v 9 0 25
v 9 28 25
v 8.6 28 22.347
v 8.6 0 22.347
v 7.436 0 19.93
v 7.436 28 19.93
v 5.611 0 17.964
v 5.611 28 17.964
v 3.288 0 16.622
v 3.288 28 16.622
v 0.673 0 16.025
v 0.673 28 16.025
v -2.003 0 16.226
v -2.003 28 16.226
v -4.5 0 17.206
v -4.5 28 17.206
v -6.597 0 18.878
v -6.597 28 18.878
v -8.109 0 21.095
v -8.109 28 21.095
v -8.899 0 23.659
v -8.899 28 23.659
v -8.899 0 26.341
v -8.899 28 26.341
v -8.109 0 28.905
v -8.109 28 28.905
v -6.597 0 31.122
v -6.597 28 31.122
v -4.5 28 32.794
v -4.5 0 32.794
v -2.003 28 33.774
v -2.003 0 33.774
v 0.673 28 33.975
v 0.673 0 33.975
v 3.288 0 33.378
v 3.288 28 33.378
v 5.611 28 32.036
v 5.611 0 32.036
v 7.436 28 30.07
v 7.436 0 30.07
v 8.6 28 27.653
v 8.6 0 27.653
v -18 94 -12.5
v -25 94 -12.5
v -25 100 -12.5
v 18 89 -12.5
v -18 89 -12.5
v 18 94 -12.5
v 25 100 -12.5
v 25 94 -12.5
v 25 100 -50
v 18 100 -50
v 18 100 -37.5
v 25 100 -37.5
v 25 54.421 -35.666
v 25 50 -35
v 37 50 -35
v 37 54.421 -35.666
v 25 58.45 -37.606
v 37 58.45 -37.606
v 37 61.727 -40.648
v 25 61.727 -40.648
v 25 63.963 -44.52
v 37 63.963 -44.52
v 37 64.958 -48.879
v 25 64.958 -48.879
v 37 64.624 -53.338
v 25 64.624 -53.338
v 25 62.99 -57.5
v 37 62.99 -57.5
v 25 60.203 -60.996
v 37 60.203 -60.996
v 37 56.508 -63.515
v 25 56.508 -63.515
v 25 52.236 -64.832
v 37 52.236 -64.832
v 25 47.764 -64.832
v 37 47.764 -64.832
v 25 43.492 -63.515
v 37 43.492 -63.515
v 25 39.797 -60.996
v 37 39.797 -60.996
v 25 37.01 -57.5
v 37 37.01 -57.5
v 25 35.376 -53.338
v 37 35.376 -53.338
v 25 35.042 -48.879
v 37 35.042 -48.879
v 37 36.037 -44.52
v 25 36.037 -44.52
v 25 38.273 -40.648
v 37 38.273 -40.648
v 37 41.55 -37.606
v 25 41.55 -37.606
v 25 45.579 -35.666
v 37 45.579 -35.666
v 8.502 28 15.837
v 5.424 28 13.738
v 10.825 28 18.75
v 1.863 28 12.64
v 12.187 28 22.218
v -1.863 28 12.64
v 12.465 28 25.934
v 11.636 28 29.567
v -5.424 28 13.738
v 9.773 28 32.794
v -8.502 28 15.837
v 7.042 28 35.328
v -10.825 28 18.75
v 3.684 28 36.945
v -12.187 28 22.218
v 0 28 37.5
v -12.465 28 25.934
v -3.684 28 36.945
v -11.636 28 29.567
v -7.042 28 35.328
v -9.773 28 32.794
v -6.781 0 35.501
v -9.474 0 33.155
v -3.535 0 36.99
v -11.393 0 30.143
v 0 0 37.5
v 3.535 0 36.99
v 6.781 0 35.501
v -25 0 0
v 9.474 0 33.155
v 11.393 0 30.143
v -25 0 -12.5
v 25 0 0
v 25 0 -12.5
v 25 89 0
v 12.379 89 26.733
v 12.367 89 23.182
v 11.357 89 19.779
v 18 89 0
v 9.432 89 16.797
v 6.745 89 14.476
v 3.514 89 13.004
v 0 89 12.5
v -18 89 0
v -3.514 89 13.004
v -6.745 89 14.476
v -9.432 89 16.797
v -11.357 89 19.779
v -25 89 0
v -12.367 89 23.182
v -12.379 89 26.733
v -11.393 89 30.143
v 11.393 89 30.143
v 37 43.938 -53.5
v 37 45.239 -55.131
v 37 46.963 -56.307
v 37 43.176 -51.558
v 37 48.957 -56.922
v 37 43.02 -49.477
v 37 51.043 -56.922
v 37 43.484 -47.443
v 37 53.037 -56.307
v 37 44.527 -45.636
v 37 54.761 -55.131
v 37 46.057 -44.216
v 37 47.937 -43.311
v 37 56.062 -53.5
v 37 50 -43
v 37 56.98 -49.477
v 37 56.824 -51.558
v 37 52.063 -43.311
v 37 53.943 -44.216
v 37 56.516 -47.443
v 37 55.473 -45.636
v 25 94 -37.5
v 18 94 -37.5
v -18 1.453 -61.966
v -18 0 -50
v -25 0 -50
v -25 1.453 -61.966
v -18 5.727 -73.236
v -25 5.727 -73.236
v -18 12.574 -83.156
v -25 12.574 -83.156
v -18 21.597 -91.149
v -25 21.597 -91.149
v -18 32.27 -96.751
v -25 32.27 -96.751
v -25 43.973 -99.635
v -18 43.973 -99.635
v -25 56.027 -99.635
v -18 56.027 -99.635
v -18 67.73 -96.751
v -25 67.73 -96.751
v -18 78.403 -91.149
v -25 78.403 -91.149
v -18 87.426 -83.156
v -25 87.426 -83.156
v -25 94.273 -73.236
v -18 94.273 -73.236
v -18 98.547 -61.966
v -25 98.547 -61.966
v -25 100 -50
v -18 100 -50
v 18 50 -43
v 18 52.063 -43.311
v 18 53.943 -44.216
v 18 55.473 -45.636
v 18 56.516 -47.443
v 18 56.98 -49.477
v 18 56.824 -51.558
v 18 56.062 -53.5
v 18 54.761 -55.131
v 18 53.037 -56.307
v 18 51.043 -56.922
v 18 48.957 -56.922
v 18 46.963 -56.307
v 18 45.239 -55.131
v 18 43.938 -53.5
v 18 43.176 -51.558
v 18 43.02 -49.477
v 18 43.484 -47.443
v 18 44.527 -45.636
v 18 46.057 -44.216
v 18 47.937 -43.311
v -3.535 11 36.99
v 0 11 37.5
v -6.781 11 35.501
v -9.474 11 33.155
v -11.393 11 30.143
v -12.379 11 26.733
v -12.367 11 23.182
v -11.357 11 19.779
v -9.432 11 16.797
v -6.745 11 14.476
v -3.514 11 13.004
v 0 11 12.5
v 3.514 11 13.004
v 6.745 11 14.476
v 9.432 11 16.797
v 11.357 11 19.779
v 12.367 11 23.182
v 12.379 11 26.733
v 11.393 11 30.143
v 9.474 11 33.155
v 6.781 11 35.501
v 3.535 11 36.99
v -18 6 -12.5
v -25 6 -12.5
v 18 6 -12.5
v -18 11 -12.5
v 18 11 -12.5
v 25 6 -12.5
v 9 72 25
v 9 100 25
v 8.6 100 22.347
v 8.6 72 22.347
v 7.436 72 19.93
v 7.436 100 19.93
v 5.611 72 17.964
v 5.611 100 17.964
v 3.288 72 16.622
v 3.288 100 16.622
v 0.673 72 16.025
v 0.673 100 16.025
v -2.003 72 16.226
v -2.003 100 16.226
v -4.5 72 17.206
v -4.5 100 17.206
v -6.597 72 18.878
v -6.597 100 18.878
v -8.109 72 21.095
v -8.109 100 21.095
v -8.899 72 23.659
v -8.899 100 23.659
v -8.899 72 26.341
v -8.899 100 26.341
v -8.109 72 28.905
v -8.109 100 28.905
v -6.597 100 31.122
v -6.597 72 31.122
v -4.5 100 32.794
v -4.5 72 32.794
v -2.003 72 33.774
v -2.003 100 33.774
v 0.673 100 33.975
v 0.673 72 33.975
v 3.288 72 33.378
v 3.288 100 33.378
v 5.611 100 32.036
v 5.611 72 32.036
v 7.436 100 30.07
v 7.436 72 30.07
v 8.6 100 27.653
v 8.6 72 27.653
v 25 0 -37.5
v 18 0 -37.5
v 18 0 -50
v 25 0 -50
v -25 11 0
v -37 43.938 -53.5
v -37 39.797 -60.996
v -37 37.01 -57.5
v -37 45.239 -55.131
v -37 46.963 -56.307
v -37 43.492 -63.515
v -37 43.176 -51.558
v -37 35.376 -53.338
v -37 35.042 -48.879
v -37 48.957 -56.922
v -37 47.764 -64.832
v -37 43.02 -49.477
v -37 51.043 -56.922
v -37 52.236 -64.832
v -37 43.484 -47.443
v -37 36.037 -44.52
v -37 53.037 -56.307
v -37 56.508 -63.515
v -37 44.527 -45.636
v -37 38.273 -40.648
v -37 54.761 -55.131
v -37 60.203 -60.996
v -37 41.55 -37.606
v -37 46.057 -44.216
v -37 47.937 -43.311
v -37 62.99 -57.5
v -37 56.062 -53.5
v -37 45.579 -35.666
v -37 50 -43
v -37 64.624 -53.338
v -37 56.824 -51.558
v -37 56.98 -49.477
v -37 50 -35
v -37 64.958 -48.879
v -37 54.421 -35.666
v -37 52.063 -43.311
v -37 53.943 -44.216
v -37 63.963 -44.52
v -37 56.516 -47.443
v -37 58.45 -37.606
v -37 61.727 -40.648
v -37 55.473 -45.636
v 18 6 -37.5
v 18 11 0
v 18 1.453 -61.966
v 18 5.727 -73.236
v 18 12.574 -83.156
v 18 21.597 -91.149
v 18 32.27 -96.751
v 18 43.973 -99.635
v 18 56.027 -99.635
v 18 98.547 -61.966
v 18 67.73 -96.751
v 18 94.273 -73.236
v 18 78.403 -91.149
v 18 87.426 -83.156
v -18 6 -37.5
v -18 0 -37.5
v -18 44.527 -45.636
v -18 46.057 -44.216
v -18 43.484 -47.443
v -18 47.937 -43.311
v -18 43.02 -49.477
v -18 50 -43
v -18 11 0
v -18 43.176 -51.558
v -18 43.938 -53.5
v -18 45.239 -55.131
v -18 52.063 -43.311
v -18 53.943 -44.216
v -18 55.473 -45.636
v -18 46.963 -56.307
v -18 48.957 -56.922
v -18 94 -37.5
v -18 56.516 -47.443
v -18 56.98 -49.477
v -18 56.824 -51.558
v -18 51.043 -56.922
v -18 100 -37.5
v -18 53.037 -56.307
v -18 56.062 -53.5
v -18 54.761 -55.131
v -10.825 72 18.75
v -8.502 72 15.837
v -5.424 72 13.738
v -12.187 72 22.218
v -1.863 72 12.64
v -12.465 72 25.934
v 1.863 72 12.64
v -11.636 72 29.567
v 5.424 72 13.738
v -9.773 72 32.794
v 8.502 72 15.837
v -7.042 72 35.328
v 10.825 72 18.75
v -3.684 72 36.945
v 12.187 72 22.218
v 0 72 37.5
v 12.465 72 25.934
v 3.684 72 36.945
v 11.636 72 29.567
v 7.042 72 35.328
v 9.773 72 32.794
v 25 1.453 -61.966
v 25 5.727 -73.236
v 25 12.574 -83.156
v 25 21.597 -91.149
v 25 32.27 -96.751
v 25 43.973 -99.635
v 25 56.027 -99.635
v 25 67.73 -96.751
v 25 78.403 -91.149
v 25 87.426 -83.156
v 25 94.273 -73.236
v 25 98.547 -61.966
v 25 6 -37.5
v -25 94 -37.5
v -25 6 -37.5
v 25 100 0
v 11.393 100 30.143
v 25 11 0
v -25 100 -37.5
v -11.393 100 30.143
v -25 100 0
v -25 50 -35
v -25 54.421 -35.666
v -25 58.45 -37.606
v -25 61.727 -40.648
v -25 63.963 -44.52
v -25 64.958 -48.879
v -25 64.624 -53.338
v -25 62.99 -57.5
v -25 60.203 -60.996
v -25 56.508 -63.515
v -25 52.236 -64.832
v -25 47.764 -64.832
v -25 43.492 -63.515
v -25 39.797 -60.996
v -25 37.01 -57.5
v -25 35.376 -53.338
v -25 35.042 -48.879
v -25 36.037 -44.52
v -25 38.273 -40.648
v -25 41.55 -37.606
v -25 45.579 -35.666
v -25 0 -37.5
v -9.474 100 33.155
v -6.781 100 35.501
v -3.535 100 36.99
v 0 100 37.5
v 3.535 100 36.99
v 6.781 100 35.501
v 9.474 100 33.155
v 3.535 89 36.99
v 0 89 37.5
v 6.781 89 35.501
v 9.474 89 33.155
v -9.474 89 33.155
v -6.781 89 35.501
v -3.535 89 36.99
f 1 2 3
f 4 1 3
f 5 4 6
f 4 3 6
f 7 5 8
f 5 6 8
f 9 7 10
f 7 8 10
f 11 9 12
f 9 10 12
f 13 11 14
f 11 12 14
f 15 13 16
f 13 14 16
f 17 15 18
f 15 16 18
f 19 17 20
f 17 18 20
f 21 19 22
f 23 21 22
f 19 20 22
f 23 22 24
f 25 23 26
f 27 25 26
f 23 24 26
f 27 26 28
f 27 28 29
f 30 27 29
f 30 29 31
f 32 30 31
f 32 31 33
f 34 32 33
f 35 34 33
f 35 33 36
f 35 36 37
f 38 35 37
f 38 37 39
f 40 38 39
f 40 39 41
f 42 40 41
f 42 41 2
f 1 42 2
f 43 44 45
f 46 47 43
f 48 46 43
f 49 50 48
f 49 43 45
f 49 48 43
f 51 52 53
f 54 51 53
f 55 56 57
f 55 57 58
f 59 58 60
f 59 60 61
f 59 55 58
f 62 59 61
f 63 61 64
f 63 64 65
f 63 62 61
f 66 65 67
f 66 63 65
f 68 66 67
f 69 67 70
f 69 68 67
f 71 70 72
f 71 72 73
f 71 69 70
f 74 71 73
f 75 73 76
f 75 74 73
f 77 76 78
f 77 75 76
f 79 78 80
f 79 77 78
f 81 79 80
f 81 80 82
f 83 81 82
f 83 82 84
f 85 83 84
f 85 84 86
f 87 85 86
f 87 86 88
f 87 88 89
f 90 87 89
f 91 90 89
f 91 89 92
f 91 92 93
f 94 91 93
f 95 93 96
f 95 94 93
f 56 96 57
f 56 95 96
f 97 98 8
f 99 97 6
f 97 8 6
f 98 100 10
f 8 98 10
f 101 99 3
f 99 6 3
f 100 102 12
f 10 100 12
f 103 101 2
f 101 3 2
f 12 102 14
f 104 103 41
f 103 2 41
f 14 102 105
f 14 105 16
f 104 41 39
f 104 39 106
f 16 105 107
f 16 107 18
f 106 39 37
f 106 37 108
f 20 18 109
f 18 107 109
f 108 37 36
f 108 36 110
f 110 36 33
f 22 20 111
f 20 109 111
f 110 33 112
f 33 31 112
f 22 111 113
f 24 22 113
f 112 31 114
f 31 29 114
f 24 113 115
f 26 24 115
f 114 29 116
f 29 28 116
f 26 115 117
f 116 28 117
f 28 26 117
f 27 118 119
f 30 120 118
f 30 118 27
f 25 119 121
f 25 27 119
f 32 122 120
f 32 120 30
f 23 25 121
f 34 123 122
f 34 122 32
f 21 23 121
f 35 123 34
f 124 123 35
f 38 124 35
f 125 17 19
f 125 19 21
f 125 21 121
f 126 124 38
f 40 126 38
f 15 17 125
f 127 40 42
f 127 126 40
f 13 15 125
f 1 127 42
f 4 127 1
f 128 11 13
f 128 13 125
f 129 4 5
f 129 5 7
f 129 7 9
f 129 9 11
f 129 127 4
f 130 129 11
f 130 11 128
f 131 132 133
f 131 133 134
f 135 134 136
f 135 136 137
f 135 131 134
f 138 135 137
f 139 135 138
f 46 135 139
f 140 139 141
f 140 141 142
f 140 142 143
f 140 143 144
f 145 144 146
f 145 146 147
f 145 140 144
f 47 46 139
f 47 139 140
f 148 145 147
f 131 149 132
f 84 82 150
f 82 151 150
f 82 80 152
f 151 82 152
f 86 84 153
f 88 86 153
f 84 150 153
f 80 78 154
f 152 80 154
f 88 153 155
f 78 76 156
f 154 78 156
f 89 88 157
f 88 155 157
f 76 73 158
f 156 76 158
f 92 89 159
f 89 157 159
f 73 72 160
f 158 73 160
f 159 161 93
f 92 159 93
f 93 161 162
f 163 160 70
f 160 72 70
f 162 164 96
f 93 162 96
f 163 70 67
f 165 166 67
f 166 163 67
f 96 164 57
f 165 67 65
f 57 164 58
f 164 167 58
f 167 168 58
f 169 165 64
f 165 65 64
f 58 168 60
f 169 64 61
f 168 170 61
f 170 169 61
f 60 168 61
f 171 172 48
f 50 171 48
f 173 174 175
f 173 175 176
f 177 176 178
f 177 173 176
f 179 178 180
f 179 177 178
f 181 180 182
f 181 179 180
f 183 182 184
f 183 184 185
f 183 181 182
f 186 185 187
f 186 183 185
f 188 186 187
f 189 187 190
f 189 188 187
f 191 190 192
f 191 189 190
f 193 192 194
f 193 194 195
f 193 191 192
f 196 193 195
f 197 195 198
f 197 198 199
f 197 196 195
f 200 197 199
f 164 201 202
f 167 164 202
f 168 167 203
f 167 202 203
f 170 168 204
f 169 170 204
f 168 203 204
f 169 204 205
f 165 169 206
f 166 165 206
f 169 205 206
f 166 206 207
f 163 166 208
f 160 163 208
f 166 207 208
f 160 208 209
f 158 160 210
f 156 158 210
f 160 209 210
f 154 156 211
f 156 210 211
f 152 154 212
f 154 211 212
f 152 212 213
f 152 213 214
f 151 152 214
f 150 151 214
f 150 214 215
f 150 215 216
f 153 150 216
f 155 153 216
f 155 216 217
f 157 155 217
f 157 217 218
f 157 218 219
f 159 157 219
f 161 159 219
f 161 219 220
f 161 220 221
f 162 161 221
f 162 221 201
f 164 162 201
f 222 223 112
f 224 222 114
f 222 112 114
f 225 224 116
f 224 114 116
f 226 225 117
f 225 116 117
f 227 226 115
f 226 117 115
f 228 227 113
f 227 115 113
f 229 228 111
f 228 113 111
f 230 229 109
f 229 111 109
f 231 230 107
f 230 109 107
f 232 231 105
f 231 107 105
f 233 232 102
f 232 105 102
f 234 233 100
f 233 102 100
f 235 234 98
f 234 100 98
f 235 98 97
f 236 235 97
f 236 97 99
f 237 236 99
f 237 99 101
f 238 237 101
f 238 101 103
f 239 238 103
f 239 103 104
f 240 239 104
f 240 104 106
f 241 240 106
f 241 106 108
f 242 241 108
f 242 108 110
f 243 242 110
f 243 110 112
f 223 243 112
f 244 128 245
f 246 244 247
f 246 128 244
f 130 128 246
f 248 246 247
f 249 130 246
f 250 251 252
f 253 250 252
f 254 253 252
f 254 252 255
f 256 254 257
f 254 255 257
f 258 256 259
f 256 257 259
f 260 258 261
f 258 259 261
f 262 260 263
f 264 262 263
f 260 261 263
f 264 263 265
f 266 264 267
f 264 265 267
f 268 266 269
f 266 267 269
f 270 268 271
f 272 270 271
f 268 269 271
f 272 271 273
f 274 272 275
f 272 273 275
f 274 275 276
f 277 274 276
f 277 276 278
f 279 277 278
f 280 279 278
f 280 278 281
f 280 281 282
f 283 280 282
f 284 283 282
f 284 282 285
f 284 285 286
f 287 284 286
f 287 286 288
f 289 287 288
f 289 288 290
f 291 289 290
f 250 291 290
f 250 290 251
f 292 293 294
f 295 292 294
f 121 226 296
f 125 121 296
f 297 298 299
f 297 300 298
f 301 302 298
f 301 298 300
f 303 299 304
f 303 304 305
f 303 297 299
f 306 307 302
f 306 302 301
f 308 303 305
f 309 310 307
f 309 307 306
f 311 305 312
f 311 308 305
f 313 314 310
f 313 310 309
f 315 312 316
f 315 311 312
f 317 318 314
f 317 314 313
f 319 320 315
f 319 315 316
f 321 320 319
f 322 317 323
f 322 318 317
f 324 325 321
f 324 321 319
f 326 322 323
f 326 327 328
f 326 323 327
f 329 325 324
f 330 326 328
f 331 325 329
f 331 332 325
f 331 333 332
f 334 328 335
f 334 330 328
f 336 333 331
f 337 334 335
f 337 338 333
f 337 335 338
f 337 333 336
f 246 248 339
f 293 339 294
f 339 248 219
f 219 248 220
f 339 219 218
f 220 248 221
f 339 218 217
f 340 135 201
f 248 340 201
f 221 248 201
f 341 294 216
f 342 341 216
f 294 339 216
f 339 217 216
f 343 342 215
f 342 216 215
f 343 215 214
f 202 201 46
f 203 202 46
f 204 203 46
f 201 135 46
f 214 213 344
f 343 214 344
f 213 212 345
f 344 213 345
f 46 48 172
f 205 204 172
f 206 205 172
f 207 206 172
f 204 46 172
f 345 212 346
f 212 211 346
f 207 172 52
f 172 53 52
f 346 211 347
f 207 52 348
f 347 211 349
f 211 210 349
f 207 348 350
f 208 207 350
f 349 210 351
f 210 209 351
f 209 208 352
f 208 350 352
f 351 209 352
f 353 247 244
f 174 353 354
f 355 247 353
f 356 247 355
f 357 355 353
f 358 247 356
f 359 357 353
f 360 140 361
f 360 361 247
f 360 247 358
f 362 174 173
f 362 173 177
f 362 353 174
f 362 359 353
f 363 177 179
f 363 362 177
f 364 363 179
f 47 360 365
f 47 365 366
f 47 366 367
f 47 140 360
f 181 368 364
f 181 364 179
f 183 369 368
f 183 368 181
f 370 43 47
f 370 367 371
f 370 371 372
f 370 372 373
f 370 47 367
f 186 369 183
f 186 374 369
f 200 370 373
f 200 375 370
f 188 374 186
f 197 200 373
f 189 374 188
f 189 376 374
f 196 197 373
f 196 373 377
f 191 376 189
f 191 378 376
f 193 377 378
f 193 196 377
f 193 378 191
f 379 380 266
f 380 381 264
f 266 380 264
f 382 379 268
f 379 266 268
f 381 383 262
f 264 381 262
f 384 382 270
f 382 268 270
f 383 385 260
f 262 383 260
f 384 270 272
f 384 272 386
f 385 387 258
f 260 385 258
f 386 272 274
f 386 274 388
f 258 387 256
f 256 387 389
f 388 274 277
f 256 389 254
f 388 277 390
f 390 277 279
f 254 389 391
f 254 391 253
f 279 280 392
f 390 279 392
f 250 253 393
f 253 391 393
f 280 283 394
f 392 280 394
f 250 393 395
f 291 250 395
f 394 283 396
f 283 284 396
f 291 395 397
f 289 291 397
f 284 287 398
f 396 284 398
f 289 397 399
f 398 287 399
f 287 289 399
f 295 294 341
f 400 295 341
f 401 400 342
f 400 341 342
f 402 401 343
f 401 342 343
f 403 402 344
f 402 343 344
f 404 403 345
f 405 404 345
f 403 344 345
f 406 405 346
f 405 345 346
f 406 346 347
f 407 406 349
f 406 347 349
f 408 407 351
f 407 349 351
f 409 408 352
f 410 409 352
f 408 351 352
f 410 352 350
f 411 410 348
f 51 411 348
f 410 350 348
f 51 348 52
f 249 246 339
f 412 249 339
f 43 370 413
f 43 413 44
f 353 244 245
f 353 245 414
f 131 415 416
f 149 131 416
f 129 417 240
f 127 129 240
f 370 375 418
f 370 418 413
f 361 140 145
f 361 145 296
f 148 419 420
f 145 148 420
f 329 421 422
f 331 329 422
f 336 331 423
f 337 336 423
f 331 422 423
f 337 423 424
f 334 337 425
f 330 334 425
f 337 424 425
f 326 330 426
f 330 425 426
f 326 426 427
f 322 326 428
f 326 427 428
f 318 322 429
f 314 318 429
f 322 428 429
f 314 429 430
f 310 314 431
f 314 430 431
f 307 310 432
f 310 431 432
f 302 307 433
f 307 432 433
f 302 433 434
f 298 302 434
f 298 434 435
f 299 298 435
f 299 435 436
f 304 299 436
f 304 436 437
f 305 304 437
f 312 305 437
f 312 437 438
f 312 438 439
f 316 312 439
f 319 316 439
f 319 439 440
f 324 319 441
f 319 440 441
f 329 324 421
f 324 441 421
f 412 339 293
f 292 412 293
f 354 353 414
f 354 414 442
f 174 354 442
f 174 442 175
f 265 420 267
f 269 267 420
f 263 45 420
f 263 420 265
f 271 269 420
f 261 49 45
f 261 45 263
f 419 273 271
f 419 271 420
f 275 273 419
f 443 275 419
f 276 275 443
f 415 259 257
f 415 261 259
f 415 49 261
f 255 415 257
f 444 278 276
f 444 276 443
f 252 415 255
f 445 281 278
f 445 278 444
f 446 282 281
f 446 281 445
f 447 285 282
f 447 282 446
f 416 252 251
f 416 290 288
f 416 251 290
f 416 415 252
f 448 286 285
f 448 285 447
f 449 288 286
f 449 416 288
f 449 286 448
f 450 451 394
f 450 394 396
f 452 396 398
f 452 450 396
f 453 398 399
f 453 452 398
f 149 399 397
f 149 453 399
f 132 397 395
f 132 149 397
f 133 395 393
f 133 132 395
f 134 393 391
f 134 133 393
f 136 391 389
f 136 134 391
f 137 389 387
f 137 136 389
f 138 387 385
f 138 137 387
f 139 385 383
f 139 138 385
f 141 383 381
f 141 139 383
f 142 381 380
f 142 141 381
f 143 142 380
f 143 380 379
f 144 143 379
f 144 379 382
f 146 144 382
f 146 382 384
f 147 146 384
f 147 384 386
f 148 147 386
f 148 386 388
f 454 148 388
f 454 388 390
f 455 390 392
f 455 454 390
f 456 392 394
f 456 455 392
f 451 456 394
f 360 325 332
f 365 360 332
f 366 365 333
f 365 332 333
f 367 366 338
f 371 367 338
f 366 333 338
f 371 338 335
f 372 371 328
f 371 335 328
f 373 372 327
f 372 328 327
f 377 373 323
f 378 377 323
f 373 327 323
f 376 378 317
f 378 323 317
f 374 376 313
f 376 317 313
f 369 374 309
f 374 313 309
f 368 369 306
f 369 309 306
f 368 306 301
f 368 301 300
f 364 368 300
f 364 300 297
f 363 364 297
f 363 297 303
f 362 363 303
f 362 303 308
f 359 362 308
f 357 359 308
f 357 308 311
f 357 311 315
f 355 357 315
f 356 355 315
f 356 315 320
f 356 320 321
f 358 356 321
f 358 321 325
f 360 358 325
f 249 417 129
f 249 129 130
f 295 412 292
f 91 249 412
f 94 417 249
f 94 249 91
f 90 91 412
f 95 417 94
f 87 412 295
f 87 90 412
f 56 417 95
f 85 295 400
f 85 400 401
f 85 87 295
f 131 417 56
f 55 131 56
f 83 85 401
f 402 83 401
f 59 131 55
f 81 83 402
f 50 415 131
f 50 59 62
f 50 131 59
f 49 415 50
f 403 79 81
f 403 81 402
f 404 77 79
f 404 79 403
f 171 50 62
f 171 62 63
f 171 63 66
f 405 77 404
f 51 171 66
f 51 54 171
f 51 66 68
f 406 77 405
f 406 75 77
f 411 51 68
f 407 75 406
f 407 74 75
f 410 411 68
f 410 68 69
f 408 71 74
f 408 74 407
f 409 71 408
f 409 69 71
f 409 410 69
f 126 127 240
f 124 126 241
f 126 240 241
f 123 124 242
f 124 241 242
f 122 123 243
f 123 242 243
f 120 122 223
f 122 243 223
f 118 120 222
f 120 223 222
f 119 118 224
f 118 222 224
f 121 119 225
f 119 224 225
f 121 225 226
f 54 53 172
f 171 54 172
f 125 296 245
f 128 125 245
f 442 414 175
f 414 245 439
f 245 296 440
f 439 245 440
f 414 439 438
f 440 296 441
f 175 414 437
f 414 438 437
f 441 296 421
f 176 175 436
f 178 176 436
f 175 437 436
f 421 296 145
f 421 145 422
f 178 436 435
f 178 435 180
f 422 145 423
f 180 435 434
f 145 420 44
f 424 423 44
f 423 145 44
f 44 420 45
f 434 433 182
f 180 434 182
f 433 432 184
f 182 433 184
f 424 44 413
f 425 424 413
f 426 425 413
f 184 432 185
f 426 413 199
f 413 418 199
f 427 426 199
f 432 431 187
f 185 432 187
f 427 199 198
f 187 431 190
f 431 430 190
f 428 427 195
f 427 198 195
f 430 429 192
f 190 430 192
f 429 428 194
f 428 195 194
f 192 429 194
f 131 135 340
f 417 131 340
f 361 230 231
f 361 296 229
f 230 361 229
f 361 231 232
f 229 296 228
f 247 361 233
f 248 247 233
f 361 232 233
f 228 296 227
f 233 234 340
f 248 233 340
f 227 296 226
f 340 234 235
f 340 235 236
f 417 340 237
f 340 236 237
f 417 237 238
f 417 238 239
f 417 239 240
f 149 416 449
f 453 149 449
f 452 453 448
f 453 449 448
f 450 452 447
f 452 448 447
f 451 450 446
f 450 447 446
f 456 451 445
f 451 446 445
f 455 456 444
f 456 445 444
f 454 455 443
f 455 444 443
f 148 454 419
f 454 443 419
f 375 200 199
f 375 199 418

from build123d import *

# Parameters (mm, degrees)
BOSS_EXTRUDE1_START = 18
BOSS_EXTRUDE1_DEPTH = 7
BOSS_EXTRUDE3_START = -18
BOSS_EXTRUDE3_DEPTH = 7
BOSS_EXTRUDE4_DEPTH = 11
BOSS_EXTRUDE5_START = -11
BOSS_EXTRUDE5_DEPTH = 11
SKETCH9_R           = 12.5
BOSS_EXTRUDE6_DEPTH = 28
BOSS_EXTRUDE7_START = -28
SKETCH11_R          = 12.5
BOSS_EXTRUDE7_DEPTH = 28
HOLE1_D             = 18
SKETCH14_R          = 15
BOSS_EXTRUDE8_DEPTH = 12
HOLE2_D             = 14


with BuildPart() as part:
    # Sketch1 → Boss-Extrude1 (new body)
    with BuildSketch(Plane(origin=(0, 0, 0), x_dir=(0, 0, -1), z_dir=(1, 0, 0)).offset(BOSS_EXTRUDE1_START)):
        with BuildLine():
            Line((0, 0), (12.5, 0))
            Line((12.5, 0), (12.5, 6))
            Line((12.5, 6), (37.5, 6))
            Line((37.5, 6), (37.5, 0))
            Line((37.5, 0), (50, 0))
            ThreePointArc((50, 0), (100, 50), (50, 100))
            Line((50, 100), (37.5, 100))
            Line((37.5, 100), (37.5, 94))
            Line((37.5, 94), (12.5, 94))
            Line((12.5, 94), (12.5, 100))
            Line((12.5, 100), (0, 100))
            Line((0, 100), (0, 0))
        make_face()
    extrude(amount=BOSS_EXTRUDE1_DEPTH)



with BuildPart() as body_2:
    # Sketch3 → Boss-Extrude3 (new body)
    with BuildSketch(Plane(origin=(0, 0, 0), x_dir=(0, 0, -1), z_dir=(1, 0, 0)).offset(BOSS_EXTRUDE3_START)):
        with BuildLine():
            Line((0, 100), (0, 0))
            Line((0, 0), (12.5, 0))
            Line((12.5, 0), (12.5, 6))
            Line((12.5, 6), (37.5, 6))
            Line((37.5, 6), (37.5, 0))
            Line((37.5, 0), (50, 0))
            ThreePointArc((50, 0), (100, 50), (50, 100))
            Line((50, 100), (37.5, 100))
            Line((37.5, 100), (37.5, 94))
            Line((37.5, 94), (12.5, 94))
            Line((12.5, 94), (12.5, 100))
            Line((12.5, 100), (0, 100))
        make_face()
    extrude(amount=-BOSS_EXTRUDE3_DEPTH)


with BuildPart() as part_1:
    add(part.part)

    add(body_2.part)  # Boss-Extrude4 merges body 2
    # Sketch5 → Boss-Extrude4 (add)
    with BuildSketch(Plane(origin=(0, 100, 0), x_dir=(1, 0, 0), z_dir=(0, 1, 0))):
        with BuildLine():
            Line((-25, 12.5), (25, 12.5))
            Line((25, 12.5), (25, 0))
            Line((25, 0), (11.392973, -30.142973))
            ThreePointArc((11.392973, -30.142973), (0, -37.5), (-11.392973, -30.142973))
            Line((-11.392973, -30.142973), (-25, 0))
            Line((-25, 0), (-25, 12.5))
        make_face()
    extrude(amount=-BOSS_EXTRUDE4_DEPTH)

    # Sketch8 → Boss-Extrude5 (add)
    with BuildSketch(Plane.XZ.offset(BOSS_EXTRUDE5_START)):
        with BuildLine():
            Line((-25, 0), (-25, -12.5))
            Line((-25, -12.5), (-18, -12.5))
            Line((-18, -12.5), (18, -12.5))
            Line((18, -12.5), (25, -12.5))
            Line((25, -12.5), (25, 0))
            Line((25, 0), (11.392973, 30.142973))
            ThreePointArc((11.392973, 30.142973), (0, 37.5), (-11.392973, 30.142973))
            Line((-11.392973, 30.142973), (-25, 0))
        make_face()
    extrude(amount=BOSS_EXTRUDE5_DEPTH)

    # Sketch9 → Boss-Extrude6 (add)
    with BuildSketch(Plane(origin=(0, 100, 0), x_dir=(1, 0, 0), z_dir=(0, 1, 0))):
        with Locations(Location((0, -25, 0), (0, 0, 270))):
            Circle(SKETCH9_R)
    extrude(amount=-BOSS_EXTRUDE6_DEPTH)

    # Sketch11 → Boss-Extrude7 (add)
    with BuildSketch(Plane.XZ.offset(BOSS_EXTRUDE7_START)):
        with Locations(Location((0, 25, 0), (0, 0, 90))):
            Circle(SKETCH11_R)
    extrude(amount=BOSS_EXTRUDE7_DEPTH)

    # Hole1 (through all)
    with Locations(Plane(origin=(0, 0, 0), x_dir=(-1, 0, 0), z_dir=(0, -1, 0))):
        with Locations((0, -25)):
            Hole(HOLE1_D / 2)

    # Sketch14 → Boss-Extrude8 (add)
    with BuildSketch(Plane.ZY.offset(25)):
        with Locations((-50, 50)):
            Circle(SKETCH14_R)
    boss_extrude8 = extrude(amount=BOSS_EXTRUDE8_DEPTH)

    # Mirror1: Boss-Extrude8 across plane
    add(boss_extrude8.mirror(Plane(origin=(0, 0, 0), x_dir=(0, 0, 1), z_dir=(1, 0, 0))))

    # Hole2 (through all)
    with Locations(Plane(origin=(37, 0, 0), x_dir=(0, 0, -1), z_dir=(1, 0, 0))):
        with Locations((50, 50)):
            Hole(HOLE2_D / 2)


solid = part_1.part
